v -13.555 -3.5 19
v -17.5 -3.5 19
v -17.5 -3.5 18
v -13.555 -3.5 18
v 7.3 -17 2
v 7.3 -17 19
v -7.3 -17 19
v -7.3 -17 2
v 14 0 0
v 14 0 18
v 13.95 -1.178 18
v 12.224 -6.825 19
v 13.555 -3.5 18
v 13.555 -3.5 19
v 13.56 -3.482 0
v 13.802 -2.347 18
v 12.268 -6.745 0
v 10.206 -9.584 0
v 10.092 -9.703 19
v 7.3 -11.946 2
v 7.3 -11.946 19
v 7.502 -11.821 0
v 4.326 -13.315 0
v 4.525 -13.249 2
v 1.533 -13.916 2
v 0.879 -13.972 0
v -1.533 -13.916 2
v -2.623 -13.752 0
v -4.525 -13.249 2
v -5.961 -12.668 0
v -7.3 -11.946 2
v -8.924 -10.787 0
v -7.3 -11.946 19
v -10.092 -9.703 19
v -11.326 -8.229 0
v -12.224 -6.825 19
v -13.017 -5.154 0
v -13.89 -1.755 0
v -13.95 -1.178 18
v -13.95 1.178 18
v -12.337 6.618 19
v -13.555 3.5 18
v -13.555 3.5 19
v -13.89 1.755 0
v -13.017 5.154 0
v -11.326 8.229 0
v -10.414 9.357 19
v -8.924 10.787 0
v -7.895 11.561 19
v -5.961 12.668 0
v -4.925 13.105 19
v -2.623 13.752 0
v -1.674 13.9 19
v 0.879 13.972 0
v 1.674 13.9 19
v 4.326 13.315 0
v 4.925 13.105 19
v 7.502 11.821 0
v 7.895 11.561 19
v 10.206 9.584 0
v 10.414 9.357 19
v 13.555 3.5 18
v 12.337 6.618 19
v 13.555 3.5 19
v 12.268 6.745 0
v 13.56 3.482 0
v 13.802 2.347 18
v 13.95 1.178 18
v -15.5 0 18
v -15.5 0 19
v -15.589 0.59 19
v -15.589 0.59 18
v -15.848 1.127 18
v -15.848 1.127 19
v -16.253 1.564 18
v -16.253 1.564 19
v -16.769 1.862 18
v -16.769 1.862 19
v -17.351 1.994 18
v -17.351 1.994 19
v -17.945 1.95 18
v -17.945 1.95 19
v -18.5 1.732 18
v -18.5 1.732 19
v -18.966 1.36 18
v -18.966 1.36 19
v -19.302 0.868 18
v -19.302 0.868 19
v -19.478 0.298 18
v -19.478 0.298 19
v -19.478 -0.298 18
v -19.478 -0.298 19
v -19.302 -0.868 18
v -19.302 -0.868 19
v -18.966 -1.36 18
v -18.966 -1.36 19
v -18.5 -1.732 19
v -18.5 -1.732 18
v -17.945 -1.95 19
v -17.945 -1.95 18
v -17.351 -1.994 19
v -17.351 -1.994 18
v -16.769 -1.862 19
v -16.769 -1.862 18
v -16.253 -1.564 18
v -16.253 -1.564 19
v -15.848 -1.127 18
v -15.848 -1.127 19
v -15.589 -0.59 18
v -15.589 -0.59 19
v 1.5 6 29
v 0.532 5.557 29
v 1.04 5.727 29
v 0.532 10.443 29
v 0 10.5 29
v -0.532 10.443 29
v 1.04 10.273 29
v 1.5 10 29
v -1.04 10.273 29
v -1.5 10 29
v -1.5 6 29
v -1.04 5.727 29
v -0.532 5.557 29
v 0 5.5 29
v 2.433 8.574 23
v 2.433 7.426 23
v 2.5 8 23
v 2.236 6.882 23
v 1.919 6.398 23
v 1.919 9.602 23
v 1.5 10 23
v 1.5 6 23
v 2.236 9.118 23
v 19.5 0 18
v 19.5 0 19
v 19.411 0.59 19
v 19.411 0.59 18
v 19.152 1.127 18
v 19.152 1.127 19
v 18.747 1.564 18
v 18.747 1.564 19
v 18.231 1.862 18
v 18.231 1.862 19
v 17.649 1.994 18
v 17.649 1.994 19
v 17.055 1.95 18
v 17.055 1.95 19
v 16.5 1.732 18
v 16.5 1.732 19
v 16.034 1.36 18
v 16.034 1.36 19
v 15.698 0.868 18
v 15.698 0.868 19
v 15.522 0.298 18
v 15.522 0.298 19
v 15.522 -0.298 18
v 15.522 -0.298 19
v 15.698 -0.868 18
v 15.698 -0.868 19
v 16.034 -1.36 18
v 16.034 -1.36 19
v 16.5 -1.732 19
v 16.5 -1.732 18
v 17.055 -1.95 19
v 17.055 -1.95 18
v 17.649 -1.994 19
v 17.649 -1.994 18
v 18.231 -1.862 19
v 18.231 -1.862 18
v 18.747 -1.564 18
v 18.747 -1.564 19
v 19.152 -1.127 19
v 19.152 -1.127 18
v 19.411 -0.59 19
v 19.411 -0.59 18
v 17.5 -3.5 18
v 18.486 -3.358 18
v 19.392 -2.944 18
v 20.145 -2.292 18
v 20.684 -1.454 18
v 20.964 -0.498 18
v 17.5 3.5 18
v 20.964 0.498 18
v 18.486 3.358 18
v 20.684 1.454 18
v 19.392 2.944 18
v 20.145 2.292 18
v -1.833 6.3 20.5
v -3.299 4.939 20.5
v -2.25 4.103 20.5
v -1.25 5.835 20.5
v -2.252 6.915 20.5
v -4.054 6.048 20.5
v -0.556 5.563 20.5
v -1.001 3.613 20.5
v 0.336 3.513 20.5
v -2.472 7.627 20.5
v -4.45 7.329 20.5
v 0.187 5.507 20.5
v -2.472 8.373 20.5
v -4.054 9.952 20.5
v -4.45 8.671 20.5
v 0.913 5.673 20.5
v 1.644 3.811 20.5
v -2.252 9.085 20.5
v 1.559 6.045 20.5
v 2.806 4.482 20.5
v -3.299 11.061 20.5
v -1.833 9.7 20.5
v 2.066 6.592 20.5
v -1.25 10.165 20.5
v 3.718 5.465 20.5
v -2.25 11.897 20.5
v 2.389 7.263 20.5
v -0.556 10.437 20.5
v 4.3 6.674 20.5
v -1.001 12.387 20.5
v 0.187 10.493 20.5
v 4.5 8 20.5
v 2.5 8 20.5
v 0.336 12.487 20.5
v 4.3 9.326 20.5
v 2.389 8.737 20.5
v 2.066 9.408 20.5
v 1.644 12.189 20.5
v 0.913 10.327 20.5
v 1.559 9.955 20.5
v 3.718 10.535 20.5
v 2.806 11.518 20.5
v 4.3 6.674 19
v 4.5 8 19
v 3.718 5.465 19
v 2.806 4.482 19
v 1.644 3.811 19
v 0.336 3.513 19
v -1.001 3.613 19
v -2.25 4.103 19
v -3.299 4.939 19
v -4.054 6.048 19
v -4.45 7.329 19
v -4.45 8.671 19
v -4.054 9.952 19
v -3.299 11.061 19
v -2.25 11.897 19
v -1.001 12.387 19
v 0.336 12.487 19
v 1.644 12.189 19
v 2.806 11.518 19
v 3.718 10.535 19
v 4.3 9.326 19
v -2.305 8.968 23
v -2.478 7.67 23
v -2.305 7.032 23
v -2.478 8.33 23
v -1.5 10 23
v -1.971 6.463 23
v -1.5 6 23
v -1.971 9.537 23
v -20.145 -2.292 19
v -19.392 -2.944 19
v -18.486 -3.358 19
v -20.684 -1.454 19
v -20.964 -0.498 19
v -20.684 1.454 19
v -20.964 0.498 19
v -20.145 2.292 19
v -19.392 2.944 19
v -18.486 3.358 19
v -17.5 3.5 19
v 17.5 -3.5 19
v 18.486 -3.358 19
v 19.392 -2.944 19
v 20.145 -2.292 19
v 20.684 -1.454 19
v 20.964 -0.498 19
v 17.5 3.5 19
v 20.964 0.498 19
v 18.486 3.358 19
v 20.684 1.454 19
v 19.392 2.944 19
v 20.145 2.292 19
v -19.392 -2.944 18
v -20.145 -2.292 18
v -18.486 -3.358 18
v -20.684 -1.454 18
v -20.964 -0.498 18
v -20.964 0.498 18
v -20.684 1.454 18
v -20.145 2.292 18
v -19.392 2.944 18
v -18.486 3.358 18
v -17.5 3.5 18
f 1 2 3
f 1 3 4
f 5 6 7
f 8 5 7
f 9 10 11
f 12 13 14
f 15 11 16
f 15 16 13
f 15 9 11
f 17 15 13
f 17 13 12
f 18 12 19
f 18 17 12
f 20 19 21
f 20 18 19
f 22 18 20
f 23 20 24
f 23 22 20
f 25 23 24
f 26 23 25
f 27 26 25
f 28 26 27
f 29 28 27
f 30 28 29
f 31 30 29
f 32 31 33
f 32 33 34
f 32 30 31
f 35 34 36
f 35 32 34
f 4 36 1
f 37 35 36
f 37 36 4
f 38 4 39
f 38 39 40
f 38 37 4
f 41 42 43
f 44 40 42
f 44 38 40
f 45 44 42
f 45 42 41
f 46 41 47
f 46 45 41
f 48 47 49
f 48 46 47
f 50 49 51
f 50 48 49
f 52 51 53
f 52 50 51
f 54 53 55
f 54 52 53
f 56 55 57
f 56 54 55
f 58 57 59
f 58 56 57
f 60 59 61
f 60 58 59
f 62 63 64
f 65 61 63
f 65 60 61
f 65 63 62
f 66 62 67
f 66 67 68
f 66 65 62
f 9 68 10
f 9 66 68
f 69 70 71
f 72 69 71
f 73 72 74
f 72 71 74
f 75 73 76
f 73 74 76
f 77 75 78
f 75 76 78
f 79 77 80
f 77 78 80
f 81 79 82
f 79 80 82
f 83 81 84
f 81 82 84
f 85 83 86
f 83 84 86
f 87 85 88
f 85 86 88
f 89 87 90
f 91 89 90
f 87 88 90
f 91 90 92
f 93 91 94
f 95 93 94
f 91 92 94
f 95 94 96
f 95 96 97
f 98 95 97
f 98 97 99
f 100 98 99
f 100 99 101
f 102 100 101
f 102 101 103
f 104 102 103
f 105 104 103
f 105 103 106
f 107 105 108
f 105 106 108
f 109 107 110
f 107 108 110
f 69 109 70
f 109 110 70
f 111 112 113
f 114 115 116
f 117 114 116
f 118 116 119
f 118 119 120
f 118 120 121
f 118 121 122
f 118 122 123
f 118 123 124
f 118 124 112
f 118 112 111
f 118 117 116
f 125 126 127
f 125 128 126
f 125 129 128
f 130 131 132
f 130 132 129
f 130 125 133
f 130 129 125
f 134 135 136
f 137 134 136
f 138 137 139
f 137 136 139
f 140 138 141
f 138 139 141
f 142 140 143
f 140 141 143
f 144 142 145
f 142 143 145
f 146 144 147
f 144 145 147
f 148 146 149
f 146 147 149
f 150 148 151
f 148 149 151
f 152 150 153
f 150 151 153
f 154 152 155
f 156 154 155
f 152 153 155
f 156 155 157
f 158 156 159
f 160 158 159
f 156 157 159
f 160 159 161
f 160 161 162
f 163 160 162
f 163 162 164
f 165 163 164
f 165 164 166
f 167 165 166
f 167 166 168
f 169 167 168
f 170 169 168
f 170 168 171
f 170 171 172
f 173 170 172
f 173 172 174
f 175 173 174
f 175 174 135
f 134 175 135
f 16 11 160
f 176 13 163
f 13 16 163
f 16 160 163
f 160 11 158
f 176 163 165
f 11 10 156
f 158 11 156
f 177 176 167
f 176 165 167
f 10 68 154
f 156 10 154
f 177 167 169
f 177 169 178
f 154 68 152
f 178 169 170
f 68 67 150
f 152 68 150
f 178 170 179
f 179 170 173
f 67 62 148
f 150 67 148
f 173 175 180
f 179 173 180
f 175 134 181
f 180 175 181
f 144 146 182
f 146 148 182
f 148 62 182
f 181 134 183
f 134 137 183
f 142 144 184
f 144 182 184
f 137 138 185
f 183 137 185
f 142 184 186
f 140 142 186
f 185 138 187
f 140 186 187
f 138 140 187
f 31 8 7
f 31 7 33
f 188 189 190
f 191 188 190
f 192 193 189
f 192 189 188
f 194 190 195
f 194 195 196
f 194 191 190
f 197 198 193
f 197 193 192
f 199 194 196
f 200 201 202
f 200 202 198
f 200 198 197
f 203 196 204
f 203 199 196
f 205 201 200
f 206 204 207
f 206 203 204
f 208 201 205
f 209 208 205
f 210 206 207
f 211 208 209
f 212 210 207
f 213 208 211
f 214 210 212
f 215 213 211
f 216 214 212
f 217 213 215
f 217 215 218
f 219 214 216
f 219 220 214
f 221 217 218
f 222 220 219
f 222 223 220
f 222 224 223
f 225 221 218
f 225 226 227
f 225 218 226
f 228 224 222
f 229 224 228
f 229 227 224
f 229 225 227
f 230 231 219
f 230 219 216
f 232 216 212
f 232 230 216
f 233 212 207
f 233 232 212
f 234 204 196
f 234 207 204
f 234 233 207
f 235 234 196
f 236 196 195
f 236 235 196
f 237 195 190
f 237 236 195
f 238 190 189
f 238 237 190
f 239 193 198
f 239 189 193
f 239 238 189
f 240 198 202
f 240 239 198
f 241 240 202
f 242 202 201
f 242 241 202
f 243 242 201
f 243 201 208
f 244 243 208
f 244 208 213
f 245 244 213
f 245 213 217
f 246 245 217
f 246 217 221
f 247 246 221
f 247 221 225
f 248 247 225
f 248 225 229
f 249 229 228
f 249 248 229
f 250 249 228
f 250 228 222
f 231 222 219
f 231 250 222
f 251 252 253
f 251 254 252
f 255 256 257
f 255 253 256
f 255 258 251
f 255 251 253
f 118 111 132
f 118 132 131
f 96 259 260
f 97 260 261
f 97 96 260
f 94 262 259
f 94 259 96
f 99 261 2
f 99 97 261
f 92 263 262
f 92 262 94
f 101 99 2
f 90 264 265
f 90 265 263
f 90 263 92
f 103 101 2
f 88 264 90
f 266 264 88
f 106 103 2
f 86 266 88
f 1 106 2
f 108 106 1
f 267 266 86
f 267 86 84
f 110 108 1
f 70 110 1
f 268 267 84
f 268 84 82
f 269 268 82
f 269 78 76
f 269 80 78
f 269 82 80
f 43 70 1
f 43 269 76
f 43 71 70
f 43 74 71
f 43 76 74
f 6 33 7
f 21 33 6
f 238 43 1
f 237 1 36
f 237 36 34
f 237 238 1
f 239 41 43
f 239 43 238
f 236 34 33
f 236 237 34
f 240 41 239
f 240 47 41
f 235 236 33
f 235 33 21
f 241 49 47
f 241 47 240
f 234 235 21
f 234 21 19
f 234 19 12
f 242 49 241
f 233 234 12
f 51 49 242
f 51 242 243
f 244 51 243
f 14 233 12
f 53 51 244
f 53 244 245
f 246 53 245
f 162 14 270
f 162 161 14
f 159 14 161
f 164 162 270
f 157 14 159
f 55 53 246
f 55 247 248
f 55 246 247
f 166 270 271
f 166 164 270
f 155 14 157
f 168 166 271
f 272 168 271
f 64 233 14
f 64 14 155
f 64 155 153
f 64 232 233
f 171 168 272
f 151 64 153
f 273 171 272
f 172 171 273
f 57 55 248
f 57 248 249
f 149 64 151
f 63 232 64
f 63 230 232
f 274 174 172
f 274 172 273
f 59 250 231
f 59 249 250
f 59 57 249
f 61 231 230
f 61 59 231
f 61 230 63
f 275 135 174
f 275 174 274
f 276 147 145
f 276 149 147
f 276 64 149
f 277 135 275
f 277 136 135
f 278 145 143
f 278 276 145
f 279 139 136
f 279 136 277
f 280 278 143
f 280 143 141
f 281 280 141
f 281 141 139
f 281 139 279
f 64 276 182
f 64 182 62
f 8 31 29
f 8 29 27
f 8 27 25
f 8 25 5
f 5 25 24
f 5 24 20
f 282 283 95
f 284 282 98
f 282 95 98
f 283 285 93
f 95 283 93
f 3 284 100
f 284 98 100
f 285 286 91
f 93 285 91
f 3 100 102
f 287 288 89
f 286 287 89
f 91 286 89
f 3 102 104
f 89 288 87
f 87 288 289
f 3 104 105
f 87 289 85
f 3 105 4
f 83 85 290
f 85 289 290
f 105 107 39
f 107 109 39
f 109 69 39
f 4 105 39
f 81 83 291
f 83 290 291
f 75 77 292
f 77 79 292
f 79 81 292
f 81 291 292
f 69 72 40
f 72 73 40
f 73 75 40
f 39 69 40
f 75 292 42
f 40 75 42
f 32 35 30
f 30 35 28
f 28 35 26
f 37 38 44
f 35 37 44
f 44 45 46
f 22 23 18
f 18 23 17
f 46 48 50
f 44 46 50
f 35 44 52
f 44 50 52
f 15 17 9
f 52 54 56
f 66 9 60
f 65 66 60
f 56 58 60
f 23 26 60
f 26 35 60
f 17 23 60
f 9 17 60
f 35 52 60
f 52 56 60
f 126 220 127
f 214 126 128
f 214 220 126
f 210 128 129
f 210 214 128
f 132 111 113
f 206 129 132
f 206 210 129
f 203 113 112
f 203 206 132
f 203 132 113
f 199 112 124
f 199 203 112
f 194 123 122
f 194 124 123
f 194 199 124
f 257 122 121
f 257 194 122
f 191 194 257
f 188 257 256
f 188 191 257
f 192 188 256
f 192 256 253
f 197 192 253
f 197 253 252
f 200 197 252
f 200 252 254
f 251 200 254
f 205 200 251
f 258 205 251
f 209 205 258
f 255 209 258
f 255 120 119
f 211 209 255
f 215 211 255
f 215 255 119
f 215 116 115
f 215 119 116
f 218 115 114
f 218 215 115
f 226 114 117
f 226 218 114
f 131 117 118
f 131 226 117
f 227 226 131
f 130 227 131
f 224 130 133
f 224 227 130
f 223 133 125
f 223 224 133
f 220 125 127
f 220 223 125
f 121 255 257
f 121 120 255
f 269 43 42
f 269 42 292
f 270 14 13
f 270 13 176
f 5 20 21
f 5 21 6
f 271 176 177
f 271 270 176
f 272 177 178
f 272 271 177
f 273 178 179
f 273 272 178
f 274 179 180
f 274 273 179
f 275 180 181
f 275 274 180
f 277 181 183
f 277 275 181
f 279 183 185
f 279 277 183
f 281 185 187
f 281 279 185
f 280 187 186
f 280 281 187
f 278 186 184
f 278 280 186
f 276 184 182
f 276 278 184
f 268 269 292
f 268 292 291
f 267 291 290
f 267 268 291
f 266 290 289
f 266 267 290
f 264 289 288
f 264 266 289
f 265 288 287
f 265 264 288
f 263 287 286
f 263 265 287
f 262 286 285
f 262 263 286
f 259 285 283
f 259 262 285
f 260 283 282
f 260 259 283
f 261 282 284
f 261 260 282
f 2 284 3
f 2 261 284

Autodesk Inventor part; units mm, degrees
ref_plane "YZ Plane" through (0, 0, 0) normal (1, 0, 0) x (0, 1, 0)
ref_plane "XZ Plane" through (0, 0, 0) normal (0, 1, 0) x (-1, 0, 0)
ref_plane "XY Plane" through (0, 0, 0) normal (0, 0, 1) x (1, 0, 0)
sketch "Náčrt1" plane through (0, 0, 0) normal (0, 0, 1) x (1, 0, 0)
  circle A0 centre (0, 0) radius 14
  dimension "d0" = 28
extrude "Vysunutí1" add sketch "Náčrt1" along normal blind 19
sketch "Náčrt2" plane through (0, 0, 19) normal (0, 0, 1) x (1, 0, 0)
  circle A0 centre (17.5, 0) radius 2
  circle A1 centre (-17.5, 0) radius 2
  line L0 (-17.5, 0) -> (17.5, 0) construction
  line L1 (-17.5, -3.5) -> (17.5, -3.5)
  line L2 (17.5, 3.5) -> (-17.5, 3.5)
  arc A2 (-17.5, 3.5) -> (-17.5, -3.5) centre (-17.5, 0) ccw
  arc A3 (17.5, -3.5) -> (17.5, 3.5) centre (17.5, 0) ccw
  point P0 (0, 0)
  point P1 (0, 0)
  dimension "d3" = 4
  dimension "d4" = 4
  dimension "d5" = 35
  dimension "d9" = 17.5
  dimension "d10" = 7
extrude "Vysunutí2" add sketch "Náčrt2" against normal blind 1
sketch "Náčrt3" plane through (0, 0, 19) normal (0, 0, 1) x (1, 0, 0)
  circle A0 centre (0, 8) radius 4.5
  point P0 (0, 0)
  dimension "d13" = 9
  dimension "d14" = 8
extrude "Vysunutí3" add sketch "Náčrt3" along normal blind 1.5
sketch "Náčrt4" plane through (0, 8, 20.5) normal (0, 0, 1) x (1, 0, 0)
  circle A0 centre (0, 0) radius 2.5
  point P0 (0, -8)
  dimension "d17" = 5
extrude "Vysunutí4" add sketch "Náčrt4" along normal blind 8.5
sketch "Náčrt5" plane through (0, 8, 29) normal (0, 0, 1) x (1, 0, 0)
  line L0 (-1.5, -2.5) -> (1.5, -2.5)
  line L1 (1.5, -2.5) -> (1.5, 2.5)
  line L2 (1.5, 2.5) -> (-1.5, 2.5)
  line L3 (-1.5, 2.5) -> (-1.5, -2.5)
  line L4 (-1.5, -2.5) -> (1.5, 2.5) construction
  line L5 (1.5, -2.5) -> (-1.5, 2.5) construction
  line L6 (-3, -3) -> (3, -3)
  line L7 (3, -3) -> (3, 3)
  line L8 (3, 3) -> (-3, 3)
  line L9 (-3, 3) -> (-3, -3)
  line L10 (-3, -3) -> (3, 3) construction
  line L11 (3, -3) -> (-3, 3) construction
  point P0 (0, -8)
  point P1 (0, 0)
  point P2 (0, 0)
  dimension "d20" = 3
  dimension "d21" = 5
  dimension "d22" = 6
  dimension "d23" = 6
extrude "Vysunutí5" cut sketch "Náčrt5" against normal blind 6
sketch "Náčrt6" plane through (0, 0, 19) normal (0, 0, 1) x (1, 0, 0)
  line L0 (-7.3, 17) -> (7.3, 17)
  line L1 (7.3, 17) -> (7.3, -17)
  line L2 (7.3, -17) -> (-7.3, -17)
  line L3 (-7.3, -17) -> (-7.3, 17)
  line L4 (-7.3, 17) -> (7.3, -17) construction
  line L5 (7.3, 17) -> (-7.3, -17) construction
  line L6 (-7.3, -8.0625) -> (7.3, -8.0625)
  point P0 (0, 0)
  dimension "d26" = 14.6
  dimension "d27" = 34
extrude "Vysunutí6" add sketch "Náčrt6" against normal blind 17 contours L6 L1 L2 L3
properties part number "StepperMotor"
